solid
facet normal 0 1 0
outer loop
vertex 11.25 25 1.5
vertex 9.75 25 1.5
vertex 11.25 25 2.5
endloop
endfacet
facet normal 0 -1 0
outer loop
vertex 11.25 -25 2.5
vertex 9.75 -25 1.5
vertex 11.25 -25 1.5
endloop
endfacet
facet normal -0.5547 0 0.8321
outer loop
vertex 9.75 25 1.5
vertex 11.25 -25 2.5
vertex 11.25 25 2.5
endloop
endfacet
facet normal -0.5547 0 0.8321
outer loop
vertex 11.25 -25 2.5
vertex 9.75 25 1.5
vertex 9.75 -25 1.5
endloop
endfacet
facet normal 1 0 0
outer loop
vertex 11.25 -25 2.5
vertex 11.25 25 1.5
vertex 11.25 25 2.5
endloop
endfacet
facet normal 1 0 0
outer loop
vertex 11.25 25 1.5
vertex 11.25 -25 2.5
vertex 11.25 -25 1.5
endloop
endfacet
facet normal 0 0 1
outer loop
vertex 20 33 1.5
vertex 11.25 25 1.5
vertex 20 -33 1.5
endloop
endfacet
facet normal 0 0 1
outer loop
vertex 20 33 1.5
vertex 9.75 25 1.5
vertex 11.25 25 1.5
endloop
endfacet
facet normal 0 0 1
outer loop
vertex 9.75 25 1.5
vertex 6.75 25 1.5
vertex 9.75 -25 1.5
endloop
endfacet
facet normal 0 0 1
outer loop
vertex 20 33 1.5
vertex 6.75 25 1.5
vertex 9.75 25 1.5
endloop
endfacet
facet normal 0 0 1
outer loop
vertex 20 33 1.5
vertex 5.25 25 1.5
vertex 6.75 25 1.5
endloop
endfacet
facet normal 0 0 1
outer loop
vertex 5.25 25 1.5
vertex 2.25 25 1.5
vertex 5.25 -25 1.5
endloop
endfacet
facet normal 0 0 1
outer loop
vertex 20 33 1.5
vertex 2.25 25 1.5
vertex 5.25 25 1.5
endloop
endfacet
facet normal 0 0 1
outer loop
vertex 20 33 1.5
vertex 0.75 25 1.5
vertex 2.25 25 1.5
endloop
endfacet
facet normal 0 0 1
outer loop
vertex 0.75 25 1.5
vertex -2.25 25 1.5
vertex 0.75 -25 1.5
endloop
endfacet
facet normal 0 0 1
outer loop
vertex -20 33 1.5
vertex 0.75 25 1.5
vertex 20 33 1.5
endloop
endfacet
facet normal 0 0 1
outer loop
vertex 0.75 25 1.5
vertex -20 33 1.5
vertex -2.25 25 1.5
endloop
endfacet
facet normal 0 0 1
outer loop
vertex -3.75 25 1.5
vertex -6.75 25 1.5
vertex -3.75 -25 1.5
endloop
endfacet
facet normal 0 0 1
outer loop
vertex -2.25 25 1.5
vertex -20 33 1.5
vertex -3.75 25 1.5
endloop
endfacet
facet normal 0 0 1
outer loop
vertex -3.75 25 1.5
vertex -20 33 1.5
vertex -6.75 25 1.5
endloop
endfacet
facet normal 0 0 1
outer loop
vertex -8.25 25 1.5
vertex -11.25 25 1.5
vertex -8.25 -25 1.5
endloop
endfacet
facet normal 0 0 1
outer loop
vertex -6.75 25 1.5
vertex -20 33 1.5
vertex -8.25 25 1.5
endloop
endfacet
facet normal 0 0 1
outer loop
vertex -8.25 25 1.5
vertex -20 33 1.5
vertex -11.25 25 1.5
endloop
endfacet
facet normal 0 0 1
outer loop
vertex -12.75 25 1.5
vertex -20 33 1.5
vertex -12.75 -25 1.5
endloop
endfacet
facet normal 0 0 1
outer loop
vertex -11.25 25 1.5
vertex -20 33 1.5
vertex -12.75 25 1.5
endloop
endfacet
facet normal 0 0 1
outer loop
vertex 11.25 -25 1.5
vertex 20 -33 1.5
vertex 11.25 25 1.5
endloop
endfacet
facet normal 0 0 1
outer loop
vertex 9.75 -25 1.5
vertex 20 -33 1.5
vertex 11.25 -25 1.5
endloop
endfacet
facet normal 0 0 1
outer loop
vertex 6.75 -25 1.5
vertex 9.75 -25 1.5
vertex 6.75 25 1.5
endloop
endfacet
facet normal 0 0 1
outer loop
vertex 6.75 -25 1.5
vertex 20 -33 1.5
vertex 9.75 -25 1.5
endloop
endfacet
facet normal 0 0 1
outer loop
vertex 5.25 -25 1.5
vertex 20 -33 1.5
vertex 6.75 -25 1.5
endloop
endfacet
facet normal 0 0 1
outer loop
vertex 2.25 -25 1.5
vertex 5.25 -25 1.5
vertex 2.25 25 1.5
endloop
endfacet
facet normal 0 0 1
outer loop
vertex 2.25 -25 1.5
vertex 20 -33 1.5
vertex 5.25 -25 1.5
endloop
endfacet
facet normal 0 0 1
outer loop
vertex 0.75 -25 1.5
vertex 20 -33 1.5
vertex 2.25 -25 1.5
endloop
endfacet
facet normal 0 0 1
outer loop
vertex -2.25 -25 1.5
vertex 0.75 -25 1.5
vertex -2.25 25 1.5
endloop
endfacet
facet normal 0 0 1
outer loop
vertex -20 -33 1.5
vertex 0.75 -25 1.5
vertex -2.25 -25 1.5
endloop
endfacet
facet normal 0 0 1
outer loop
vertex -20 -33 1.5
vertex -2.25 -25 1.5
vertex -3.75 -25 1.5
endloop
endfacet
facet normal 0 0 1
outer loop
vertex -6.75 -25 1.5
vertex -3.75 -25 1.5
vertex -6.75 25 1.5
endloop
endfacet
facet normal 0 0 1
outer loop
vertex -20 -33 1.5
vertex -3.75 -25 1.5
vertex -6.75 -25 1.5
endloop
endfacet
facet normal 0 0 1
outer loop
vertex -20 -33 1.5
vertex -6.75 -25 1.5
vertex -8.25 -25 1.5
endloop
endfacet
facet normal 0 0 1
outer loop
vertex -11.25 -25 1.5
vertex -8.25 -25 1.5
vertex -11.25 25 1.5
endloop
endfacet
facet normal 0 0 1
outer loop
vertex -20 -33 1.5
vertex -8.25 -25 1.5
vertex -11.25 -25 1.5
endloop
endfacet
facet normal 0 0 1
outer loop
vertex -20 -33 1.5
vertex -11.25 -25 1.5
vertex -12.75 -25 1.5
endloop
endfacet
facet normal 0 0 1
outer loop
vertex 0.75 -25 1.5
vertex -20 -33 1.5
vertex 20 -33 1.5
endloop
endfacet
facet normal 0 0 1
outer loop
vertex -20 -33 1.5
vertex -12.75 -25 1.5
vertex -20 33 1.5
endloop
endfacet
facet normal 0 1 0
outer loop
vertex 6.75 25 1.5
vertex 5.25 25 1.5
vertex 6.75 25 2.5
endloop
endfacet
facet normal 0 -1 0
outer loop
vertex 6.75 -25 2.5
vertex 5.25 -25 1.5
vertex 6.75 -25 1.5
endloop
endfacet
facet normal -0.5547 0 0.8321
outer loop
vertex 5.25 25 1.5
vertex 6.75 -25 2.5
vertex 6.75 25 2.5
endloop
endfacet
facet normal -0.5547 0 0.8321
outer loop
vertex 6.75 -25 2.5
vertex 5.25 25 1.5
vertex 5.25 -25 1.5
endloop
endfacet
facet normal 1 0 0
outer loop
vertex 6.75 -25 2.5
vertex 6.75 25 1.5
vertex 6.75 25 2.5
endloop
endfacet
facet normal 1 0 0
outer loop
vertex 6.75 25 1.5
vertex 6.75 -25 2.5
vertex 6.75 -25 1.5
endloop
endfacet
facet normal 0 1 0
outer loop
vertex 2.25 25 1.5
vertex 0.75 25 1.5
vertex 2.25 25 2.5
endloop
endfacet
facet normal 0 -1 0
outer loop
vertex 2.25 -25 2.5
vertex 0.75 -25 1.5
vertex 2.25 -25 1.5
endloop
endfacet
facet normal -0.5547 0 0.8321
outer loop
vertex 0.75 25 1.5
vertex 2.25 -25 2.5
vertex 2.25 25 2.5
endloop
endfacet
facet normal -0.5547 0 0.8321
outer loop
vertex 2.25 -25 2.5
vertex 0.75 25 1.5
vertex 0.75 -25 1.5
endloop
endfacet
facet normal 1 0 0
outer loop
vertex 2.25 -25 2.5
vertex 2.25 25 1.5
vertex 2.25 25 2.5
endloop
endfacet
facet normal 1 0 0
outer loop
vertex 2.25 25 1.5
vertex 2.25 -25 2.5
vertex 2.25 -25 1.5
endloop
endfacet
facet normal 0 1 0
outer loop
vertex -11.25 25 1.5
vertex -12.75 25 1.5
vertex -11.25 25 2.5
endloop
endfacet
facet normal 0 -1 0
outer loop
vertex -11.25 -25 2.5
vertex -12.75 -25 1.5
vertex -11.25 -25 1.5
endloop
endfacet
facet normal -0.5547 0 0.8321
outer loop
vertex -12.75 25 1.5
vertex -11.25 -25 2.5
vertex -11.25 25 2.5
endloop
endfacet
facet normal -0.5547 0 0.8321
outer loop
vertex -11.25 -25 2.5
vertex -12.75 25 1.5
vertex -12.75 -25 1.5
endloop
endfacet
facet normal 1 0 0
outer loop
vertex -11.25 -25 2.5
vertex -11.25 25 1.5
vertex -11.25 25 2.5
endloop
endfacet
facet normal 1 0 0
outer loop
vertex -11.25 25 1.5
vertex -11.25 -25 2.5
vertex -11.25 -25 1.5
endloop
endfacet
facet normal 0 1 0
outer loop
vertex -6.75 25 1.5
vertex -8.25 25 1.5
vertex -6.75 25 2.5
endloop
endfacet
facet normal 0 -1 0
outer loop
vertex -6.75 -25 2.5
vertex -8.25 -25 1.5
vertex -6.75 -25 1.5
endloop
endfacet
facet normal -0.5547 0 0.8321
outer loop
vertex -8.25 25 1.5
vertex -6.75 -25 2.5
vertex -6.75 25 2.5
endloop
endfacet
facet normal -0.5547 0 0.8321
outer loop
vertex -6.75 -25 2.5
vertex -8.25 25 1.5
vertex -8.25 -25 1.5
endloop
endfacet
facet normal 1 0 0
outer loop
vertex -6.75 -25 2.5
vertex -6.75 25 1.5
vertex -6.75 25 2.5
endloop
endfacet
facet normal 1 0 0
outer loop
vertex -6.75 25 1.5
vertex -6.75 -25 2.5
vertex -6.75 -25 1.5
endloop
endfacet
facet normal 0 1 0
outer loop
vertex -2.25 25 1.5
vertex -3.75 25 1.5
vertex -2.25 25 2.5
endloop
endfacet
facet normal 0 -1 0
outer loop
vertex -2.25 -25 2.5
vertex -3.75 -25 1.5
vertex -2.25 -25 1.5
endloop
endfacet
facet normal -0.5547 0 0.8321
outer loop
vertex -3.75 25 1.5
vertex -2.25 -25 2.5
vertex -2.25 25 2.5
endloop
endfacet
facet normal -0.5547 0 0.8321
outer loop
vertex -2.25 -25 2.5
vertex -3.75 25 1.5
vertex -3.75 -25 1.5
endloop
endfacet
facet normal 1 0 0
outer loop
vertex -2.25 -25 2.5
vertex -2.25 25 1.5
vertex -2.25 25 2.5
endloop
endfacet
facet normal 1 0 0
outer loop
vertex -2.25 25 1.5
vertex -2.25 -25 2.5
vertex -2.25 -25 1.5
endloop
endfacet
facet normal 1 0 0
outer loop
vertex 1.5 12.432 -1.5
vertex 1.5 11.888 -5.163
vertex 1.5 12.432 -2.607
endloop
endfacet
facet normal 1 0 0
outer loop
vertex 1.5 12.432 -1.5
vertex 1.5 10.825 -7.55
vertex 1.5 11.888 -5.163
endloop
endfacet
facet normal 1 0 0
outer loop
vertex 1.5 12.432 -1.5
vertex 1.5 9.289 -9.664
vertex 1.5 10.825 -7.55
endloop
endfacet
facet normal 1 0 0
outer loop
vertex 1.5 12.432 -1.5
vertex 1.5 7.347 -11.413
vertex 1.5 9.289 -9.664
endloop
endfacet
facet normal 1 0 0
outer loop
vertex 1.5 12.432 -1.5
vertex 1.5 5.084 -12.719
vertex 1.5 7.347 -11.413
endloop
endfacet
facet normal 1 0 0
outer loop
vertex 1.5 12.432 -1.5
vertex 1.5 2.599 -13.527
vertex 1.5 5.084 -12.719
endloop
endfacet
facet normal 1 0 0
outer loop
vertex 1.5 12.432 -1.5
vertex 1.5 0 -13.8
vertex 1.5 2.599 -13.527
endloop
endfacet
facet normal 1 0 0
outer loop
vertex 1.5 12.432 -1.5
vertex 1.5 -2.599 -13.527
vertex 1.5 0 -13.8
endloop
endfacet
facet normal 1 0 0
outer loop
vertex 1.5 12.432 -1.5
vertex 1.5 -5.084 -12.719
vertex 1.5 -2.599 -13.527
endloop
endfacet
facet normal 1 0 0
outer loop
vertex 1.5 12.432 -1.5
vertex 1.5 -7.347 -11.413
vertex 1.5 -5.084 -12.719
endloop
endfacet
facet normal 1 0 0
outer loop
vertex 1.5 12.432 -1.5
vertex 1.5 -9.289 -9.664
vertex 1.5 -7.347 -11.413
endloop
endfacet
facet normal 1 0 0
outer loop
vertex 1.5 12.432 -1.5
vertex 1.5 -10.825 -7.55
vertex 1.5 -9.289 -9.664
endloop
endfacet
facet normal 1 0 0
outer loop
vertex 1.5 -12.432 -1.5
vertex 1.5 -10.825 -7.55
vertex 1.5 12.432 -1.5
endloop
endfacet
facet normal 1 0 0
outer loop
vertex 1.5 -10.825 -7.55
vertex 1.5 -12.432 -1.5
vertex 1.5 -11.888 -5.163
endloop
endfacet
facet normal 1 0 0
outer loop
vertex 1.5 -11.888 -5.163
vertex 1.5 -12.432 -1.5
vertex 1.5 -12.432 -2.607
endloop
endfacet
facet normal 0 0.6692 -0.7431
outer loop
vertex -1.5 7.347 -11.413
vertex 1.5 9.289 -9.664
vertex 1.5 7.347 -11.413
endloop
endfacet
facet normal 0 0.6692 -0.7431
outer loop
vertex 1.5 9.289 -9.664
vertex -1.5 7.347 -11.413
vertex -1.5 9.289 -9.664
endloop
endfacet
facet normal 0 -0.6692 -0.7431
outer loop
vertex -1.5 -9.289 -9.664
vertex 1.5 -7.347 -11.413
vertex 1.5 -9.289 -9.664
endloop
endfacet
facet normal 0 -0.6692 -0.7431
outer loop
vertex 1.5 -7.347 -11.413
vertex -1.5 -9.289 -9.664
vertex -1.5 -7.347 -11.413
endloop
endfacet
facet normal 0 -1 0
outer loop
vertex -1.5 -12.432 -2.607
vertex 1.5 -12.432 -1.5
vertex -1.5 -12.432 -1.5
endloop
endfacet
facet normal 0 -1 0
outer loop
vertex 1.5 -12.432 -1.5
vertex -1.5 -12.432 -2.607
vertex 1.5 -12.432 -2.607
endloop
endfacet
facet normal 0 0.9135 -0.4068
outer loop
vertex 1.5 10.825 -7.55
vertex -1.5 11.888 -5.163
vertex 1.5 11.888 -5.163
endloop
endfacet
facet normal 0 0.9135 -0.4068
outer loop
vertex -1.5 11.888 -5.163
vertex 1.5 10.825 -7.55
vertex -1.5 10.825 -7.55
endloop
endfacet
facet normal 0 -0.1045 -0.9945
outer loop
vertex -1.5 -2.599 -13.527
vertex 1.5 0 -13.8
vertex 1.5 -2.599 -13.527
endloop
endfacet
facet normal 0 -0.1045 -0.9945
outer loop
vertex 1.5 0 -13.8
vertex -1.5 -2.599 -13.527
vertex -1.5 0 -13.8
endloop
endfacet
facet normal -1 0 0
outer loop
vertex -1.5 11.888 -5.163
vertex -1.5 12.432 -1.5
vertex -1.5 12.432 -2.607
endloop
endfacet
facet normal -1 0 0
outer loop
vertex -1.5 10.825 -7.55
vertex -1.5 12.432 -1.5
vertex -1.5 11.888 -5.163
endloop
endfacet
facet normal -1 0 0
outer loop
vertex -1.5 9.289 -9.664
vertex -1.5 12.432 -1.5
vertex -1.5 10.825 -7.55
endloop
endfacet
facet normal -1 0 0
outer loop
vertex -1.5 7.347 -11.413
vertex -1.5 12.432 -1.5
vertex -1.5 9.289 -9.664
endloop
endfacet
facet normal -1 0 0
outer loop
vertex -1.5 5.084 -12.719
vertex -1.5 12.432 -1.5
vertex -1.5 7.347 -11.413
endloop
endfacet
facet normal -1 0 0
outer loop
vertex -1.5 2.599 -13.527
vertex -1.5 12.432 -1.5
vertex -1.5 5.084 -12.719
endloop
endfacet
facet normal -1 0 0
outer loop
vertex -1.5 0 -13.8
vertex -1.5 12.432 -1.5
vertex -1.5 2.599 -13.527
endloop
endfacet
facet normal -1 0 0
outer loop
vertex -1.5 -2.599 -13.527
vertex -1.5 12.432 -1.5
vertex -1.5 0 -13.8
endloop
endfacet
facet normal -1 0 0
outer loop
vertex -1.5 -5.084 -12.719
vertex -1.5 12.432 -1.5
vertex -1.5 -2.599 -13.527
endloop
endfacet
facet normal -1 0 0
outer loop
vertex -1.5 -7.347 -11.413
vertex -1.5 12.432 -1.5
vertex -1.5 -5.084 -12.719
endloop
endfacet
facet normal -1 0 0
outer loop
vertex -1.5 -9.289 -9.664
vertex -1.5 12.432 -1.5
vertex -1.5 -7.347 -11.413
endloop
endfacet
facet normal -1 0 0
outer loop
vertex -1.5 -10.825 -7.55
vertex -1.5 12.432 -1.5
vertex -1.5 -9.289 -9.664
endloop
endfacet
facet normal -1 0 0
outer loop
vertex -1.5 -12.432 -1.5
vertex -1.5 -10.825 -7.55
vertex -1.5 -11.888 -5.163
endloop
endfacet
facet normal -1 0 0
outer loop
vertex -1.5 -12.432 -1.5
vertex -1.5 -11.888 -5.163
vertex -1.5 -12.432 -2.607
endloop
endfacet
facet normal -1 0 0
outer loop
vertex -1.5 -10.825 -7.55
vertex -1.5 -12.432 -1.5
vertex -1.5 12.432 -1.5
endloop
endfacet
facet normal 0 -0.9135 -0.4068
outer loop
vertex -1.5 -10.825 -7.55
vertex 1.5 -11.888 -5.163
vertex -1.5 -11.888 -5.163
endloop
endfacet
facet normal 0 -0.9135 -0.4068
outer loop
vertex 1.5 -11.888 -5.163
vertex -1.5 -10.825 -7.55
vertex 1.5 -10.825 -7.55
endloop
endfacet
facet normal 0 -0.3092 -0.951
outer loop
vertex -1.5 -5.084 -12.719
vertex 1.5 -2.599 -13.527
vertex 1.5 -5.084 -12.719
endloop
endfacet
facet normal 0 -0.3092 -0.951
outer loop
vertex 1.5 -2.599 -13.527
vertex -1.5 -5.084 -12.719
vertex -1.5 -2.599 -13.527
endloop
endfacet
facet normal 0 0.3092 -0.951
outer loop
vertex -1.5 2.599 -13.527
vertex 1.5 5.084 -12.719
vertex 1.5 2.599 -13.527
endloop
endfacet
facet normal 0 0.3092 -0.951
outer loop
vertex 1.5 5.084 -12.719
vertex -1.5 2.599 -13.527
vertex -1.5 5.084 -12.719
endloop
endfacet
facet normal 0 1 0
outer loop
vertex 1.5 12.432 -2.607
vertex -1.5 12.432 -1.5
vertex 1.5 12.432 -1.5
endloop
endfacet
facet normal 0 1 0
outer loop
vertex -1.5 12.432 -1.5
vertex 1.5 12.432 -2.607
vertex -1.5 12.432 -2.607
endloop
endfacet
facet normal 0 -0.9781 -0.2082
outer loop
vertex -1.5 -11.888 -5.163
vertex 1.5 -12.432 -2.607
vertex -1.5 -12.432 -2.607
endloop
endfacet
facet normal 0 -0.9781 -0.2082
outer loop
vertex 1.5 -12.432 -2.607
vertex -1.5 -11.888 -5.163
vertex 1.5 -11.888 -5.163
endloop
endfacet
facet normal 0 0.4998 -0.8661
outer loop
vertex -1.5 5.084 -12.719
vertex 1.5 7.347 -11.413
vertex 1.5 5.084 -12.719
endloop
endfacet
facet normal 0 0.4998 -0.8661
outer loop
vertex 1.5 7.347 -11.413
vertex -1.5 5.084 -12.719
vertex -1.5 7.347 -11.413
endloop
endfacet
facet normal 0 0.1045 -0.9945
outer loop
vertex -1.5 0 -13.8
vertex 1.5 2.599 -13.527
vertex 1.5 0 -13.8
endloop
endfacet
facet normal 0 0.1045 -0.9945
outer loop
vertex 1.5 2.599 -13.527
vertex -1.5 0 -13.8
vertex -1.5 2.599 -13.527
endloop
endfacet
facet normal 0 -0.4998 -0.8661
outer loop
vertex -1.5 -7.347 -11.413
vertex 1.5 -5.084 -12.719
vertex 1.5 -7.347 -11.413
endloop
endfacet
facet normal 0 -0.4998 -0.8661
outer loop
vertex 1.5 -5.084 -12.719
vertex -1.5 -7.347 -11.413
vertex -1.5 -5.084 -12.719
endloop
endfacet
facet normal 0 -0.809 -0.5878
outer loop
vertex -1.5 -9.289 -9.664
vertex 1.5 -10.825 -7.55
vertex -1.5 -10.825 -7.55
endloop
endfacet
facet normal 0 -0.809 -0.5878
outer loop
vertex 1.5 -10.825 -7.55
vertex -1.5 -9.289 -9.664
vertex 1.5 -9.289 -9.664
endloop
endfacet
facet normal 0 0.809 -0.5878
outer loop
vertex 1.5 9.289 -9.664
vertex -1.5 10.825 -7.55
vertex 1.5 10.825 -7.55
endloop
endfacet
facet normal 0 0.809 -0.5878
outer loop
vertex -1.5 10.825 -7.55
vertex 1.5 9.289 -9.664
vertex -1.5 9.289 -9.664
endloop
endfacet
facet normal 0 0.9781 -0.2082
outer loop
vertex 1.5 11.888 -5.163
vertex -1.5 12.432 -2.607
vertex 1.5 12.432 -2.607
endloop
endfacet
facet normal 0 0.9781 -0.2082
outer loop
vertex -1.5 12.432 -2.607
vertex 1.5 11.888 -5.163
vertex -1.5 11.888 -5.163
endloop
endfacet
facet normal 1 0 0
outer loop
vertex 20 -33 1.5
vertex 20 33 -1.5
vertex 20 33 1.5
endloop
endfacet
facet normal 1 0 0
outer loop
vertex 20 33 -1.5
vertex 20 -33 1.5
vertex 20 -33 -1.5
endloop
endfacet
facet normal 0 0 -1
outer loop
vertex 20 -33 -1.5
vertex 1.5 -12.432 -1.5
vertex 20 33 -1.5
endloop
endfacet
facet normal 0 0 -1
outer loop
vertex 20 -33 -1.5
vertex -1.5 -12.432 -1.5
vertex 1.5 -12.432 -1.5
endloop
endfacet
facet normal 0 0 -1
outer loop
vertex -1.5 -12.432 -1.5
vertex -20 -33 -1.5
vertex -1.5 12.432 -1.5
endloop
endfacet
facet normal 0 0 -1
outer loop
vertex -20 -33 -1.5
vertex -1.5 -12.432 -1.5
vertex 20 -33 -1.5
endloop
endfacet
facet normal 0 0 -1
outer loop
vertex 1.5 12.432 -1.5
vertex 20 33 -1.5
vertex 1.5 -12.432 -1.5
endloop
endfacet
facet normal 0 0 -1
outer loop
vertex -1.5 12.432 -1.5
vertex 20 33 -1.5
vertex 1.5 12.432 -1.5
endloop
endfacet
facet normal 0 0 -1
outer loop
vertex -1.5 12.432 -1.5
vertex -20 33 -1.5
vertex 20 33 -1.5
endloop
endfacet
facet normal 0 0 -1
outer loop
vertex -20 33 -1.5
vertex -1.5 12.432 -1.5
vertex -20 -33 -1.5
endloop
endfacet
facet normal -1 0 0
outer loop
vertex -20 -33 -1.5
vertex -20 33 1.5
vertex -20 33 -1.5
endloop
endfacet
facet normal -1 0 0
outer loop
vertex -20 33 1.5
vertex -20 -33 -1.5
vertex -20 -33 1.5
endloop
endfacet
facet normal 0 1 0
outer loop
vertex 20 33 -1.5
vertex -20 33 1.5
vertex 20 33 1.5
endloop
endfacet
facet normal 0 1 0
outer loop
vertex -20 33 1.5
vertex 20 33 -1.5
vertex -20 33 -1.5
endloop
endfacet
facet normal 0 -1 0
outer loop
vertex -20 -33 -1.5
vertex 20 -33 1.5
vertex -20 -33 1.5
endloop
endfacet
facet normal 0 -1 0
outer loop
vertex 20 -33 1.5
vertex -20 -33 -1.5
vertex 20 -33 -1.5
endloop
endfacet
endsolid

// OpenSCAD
bPx = 40;
bPy = 66;
bPz = 3;


lb = 1.5;
lh = 1.0;
lw = 50;
ld = 8;
basePlate();


module basePlate() {
   cube(size=[bPx, bPy, bPz], center=true);
   translate([0, 0, bPz/2]) {lanes();}
   translate([0, 0, -bPz/2+.2]) {handle();}
   %translate([0, bPy/2-8, -bPz/2+.5]) {lablabel();}
}

module lanes() {
   translate([lb*7.5,0,0]) {lane();}
   translate([lb*4.5,0,0]) {lane();}
   translate([lb*1.5,0,0]) {lane();}
   translate([-lb*7.5,0,0]) {lane();}
   translate([-lb*4.5,0,0]) {lane();}
   translate([-lb*1.5,0,0]) {lane();}
}

module lane() {
   rotate([90, -90, 0]) {
      linear_extrude(height=lw, center=true, convexity=10, twist=0) {
         polygon(points=[[0,0],[lh,0],[0,lb]], paths=[[0,1,2]]);

      }
   }
}

module handle() {
   rotate([00, -90, 0]) {
      difference() {
         cylinder(r=25/2, h=3, center=true);
         translate([20, 0, 0]) {cube(size=[40,60,6], center=true);}
      }
   }
}

module lablabel() {
   rotate([0, 180, 0]) {
      scale([.05, .05, 0.05]){surface(file = "KindtLabBanner.png", center = true);}
   }
}
